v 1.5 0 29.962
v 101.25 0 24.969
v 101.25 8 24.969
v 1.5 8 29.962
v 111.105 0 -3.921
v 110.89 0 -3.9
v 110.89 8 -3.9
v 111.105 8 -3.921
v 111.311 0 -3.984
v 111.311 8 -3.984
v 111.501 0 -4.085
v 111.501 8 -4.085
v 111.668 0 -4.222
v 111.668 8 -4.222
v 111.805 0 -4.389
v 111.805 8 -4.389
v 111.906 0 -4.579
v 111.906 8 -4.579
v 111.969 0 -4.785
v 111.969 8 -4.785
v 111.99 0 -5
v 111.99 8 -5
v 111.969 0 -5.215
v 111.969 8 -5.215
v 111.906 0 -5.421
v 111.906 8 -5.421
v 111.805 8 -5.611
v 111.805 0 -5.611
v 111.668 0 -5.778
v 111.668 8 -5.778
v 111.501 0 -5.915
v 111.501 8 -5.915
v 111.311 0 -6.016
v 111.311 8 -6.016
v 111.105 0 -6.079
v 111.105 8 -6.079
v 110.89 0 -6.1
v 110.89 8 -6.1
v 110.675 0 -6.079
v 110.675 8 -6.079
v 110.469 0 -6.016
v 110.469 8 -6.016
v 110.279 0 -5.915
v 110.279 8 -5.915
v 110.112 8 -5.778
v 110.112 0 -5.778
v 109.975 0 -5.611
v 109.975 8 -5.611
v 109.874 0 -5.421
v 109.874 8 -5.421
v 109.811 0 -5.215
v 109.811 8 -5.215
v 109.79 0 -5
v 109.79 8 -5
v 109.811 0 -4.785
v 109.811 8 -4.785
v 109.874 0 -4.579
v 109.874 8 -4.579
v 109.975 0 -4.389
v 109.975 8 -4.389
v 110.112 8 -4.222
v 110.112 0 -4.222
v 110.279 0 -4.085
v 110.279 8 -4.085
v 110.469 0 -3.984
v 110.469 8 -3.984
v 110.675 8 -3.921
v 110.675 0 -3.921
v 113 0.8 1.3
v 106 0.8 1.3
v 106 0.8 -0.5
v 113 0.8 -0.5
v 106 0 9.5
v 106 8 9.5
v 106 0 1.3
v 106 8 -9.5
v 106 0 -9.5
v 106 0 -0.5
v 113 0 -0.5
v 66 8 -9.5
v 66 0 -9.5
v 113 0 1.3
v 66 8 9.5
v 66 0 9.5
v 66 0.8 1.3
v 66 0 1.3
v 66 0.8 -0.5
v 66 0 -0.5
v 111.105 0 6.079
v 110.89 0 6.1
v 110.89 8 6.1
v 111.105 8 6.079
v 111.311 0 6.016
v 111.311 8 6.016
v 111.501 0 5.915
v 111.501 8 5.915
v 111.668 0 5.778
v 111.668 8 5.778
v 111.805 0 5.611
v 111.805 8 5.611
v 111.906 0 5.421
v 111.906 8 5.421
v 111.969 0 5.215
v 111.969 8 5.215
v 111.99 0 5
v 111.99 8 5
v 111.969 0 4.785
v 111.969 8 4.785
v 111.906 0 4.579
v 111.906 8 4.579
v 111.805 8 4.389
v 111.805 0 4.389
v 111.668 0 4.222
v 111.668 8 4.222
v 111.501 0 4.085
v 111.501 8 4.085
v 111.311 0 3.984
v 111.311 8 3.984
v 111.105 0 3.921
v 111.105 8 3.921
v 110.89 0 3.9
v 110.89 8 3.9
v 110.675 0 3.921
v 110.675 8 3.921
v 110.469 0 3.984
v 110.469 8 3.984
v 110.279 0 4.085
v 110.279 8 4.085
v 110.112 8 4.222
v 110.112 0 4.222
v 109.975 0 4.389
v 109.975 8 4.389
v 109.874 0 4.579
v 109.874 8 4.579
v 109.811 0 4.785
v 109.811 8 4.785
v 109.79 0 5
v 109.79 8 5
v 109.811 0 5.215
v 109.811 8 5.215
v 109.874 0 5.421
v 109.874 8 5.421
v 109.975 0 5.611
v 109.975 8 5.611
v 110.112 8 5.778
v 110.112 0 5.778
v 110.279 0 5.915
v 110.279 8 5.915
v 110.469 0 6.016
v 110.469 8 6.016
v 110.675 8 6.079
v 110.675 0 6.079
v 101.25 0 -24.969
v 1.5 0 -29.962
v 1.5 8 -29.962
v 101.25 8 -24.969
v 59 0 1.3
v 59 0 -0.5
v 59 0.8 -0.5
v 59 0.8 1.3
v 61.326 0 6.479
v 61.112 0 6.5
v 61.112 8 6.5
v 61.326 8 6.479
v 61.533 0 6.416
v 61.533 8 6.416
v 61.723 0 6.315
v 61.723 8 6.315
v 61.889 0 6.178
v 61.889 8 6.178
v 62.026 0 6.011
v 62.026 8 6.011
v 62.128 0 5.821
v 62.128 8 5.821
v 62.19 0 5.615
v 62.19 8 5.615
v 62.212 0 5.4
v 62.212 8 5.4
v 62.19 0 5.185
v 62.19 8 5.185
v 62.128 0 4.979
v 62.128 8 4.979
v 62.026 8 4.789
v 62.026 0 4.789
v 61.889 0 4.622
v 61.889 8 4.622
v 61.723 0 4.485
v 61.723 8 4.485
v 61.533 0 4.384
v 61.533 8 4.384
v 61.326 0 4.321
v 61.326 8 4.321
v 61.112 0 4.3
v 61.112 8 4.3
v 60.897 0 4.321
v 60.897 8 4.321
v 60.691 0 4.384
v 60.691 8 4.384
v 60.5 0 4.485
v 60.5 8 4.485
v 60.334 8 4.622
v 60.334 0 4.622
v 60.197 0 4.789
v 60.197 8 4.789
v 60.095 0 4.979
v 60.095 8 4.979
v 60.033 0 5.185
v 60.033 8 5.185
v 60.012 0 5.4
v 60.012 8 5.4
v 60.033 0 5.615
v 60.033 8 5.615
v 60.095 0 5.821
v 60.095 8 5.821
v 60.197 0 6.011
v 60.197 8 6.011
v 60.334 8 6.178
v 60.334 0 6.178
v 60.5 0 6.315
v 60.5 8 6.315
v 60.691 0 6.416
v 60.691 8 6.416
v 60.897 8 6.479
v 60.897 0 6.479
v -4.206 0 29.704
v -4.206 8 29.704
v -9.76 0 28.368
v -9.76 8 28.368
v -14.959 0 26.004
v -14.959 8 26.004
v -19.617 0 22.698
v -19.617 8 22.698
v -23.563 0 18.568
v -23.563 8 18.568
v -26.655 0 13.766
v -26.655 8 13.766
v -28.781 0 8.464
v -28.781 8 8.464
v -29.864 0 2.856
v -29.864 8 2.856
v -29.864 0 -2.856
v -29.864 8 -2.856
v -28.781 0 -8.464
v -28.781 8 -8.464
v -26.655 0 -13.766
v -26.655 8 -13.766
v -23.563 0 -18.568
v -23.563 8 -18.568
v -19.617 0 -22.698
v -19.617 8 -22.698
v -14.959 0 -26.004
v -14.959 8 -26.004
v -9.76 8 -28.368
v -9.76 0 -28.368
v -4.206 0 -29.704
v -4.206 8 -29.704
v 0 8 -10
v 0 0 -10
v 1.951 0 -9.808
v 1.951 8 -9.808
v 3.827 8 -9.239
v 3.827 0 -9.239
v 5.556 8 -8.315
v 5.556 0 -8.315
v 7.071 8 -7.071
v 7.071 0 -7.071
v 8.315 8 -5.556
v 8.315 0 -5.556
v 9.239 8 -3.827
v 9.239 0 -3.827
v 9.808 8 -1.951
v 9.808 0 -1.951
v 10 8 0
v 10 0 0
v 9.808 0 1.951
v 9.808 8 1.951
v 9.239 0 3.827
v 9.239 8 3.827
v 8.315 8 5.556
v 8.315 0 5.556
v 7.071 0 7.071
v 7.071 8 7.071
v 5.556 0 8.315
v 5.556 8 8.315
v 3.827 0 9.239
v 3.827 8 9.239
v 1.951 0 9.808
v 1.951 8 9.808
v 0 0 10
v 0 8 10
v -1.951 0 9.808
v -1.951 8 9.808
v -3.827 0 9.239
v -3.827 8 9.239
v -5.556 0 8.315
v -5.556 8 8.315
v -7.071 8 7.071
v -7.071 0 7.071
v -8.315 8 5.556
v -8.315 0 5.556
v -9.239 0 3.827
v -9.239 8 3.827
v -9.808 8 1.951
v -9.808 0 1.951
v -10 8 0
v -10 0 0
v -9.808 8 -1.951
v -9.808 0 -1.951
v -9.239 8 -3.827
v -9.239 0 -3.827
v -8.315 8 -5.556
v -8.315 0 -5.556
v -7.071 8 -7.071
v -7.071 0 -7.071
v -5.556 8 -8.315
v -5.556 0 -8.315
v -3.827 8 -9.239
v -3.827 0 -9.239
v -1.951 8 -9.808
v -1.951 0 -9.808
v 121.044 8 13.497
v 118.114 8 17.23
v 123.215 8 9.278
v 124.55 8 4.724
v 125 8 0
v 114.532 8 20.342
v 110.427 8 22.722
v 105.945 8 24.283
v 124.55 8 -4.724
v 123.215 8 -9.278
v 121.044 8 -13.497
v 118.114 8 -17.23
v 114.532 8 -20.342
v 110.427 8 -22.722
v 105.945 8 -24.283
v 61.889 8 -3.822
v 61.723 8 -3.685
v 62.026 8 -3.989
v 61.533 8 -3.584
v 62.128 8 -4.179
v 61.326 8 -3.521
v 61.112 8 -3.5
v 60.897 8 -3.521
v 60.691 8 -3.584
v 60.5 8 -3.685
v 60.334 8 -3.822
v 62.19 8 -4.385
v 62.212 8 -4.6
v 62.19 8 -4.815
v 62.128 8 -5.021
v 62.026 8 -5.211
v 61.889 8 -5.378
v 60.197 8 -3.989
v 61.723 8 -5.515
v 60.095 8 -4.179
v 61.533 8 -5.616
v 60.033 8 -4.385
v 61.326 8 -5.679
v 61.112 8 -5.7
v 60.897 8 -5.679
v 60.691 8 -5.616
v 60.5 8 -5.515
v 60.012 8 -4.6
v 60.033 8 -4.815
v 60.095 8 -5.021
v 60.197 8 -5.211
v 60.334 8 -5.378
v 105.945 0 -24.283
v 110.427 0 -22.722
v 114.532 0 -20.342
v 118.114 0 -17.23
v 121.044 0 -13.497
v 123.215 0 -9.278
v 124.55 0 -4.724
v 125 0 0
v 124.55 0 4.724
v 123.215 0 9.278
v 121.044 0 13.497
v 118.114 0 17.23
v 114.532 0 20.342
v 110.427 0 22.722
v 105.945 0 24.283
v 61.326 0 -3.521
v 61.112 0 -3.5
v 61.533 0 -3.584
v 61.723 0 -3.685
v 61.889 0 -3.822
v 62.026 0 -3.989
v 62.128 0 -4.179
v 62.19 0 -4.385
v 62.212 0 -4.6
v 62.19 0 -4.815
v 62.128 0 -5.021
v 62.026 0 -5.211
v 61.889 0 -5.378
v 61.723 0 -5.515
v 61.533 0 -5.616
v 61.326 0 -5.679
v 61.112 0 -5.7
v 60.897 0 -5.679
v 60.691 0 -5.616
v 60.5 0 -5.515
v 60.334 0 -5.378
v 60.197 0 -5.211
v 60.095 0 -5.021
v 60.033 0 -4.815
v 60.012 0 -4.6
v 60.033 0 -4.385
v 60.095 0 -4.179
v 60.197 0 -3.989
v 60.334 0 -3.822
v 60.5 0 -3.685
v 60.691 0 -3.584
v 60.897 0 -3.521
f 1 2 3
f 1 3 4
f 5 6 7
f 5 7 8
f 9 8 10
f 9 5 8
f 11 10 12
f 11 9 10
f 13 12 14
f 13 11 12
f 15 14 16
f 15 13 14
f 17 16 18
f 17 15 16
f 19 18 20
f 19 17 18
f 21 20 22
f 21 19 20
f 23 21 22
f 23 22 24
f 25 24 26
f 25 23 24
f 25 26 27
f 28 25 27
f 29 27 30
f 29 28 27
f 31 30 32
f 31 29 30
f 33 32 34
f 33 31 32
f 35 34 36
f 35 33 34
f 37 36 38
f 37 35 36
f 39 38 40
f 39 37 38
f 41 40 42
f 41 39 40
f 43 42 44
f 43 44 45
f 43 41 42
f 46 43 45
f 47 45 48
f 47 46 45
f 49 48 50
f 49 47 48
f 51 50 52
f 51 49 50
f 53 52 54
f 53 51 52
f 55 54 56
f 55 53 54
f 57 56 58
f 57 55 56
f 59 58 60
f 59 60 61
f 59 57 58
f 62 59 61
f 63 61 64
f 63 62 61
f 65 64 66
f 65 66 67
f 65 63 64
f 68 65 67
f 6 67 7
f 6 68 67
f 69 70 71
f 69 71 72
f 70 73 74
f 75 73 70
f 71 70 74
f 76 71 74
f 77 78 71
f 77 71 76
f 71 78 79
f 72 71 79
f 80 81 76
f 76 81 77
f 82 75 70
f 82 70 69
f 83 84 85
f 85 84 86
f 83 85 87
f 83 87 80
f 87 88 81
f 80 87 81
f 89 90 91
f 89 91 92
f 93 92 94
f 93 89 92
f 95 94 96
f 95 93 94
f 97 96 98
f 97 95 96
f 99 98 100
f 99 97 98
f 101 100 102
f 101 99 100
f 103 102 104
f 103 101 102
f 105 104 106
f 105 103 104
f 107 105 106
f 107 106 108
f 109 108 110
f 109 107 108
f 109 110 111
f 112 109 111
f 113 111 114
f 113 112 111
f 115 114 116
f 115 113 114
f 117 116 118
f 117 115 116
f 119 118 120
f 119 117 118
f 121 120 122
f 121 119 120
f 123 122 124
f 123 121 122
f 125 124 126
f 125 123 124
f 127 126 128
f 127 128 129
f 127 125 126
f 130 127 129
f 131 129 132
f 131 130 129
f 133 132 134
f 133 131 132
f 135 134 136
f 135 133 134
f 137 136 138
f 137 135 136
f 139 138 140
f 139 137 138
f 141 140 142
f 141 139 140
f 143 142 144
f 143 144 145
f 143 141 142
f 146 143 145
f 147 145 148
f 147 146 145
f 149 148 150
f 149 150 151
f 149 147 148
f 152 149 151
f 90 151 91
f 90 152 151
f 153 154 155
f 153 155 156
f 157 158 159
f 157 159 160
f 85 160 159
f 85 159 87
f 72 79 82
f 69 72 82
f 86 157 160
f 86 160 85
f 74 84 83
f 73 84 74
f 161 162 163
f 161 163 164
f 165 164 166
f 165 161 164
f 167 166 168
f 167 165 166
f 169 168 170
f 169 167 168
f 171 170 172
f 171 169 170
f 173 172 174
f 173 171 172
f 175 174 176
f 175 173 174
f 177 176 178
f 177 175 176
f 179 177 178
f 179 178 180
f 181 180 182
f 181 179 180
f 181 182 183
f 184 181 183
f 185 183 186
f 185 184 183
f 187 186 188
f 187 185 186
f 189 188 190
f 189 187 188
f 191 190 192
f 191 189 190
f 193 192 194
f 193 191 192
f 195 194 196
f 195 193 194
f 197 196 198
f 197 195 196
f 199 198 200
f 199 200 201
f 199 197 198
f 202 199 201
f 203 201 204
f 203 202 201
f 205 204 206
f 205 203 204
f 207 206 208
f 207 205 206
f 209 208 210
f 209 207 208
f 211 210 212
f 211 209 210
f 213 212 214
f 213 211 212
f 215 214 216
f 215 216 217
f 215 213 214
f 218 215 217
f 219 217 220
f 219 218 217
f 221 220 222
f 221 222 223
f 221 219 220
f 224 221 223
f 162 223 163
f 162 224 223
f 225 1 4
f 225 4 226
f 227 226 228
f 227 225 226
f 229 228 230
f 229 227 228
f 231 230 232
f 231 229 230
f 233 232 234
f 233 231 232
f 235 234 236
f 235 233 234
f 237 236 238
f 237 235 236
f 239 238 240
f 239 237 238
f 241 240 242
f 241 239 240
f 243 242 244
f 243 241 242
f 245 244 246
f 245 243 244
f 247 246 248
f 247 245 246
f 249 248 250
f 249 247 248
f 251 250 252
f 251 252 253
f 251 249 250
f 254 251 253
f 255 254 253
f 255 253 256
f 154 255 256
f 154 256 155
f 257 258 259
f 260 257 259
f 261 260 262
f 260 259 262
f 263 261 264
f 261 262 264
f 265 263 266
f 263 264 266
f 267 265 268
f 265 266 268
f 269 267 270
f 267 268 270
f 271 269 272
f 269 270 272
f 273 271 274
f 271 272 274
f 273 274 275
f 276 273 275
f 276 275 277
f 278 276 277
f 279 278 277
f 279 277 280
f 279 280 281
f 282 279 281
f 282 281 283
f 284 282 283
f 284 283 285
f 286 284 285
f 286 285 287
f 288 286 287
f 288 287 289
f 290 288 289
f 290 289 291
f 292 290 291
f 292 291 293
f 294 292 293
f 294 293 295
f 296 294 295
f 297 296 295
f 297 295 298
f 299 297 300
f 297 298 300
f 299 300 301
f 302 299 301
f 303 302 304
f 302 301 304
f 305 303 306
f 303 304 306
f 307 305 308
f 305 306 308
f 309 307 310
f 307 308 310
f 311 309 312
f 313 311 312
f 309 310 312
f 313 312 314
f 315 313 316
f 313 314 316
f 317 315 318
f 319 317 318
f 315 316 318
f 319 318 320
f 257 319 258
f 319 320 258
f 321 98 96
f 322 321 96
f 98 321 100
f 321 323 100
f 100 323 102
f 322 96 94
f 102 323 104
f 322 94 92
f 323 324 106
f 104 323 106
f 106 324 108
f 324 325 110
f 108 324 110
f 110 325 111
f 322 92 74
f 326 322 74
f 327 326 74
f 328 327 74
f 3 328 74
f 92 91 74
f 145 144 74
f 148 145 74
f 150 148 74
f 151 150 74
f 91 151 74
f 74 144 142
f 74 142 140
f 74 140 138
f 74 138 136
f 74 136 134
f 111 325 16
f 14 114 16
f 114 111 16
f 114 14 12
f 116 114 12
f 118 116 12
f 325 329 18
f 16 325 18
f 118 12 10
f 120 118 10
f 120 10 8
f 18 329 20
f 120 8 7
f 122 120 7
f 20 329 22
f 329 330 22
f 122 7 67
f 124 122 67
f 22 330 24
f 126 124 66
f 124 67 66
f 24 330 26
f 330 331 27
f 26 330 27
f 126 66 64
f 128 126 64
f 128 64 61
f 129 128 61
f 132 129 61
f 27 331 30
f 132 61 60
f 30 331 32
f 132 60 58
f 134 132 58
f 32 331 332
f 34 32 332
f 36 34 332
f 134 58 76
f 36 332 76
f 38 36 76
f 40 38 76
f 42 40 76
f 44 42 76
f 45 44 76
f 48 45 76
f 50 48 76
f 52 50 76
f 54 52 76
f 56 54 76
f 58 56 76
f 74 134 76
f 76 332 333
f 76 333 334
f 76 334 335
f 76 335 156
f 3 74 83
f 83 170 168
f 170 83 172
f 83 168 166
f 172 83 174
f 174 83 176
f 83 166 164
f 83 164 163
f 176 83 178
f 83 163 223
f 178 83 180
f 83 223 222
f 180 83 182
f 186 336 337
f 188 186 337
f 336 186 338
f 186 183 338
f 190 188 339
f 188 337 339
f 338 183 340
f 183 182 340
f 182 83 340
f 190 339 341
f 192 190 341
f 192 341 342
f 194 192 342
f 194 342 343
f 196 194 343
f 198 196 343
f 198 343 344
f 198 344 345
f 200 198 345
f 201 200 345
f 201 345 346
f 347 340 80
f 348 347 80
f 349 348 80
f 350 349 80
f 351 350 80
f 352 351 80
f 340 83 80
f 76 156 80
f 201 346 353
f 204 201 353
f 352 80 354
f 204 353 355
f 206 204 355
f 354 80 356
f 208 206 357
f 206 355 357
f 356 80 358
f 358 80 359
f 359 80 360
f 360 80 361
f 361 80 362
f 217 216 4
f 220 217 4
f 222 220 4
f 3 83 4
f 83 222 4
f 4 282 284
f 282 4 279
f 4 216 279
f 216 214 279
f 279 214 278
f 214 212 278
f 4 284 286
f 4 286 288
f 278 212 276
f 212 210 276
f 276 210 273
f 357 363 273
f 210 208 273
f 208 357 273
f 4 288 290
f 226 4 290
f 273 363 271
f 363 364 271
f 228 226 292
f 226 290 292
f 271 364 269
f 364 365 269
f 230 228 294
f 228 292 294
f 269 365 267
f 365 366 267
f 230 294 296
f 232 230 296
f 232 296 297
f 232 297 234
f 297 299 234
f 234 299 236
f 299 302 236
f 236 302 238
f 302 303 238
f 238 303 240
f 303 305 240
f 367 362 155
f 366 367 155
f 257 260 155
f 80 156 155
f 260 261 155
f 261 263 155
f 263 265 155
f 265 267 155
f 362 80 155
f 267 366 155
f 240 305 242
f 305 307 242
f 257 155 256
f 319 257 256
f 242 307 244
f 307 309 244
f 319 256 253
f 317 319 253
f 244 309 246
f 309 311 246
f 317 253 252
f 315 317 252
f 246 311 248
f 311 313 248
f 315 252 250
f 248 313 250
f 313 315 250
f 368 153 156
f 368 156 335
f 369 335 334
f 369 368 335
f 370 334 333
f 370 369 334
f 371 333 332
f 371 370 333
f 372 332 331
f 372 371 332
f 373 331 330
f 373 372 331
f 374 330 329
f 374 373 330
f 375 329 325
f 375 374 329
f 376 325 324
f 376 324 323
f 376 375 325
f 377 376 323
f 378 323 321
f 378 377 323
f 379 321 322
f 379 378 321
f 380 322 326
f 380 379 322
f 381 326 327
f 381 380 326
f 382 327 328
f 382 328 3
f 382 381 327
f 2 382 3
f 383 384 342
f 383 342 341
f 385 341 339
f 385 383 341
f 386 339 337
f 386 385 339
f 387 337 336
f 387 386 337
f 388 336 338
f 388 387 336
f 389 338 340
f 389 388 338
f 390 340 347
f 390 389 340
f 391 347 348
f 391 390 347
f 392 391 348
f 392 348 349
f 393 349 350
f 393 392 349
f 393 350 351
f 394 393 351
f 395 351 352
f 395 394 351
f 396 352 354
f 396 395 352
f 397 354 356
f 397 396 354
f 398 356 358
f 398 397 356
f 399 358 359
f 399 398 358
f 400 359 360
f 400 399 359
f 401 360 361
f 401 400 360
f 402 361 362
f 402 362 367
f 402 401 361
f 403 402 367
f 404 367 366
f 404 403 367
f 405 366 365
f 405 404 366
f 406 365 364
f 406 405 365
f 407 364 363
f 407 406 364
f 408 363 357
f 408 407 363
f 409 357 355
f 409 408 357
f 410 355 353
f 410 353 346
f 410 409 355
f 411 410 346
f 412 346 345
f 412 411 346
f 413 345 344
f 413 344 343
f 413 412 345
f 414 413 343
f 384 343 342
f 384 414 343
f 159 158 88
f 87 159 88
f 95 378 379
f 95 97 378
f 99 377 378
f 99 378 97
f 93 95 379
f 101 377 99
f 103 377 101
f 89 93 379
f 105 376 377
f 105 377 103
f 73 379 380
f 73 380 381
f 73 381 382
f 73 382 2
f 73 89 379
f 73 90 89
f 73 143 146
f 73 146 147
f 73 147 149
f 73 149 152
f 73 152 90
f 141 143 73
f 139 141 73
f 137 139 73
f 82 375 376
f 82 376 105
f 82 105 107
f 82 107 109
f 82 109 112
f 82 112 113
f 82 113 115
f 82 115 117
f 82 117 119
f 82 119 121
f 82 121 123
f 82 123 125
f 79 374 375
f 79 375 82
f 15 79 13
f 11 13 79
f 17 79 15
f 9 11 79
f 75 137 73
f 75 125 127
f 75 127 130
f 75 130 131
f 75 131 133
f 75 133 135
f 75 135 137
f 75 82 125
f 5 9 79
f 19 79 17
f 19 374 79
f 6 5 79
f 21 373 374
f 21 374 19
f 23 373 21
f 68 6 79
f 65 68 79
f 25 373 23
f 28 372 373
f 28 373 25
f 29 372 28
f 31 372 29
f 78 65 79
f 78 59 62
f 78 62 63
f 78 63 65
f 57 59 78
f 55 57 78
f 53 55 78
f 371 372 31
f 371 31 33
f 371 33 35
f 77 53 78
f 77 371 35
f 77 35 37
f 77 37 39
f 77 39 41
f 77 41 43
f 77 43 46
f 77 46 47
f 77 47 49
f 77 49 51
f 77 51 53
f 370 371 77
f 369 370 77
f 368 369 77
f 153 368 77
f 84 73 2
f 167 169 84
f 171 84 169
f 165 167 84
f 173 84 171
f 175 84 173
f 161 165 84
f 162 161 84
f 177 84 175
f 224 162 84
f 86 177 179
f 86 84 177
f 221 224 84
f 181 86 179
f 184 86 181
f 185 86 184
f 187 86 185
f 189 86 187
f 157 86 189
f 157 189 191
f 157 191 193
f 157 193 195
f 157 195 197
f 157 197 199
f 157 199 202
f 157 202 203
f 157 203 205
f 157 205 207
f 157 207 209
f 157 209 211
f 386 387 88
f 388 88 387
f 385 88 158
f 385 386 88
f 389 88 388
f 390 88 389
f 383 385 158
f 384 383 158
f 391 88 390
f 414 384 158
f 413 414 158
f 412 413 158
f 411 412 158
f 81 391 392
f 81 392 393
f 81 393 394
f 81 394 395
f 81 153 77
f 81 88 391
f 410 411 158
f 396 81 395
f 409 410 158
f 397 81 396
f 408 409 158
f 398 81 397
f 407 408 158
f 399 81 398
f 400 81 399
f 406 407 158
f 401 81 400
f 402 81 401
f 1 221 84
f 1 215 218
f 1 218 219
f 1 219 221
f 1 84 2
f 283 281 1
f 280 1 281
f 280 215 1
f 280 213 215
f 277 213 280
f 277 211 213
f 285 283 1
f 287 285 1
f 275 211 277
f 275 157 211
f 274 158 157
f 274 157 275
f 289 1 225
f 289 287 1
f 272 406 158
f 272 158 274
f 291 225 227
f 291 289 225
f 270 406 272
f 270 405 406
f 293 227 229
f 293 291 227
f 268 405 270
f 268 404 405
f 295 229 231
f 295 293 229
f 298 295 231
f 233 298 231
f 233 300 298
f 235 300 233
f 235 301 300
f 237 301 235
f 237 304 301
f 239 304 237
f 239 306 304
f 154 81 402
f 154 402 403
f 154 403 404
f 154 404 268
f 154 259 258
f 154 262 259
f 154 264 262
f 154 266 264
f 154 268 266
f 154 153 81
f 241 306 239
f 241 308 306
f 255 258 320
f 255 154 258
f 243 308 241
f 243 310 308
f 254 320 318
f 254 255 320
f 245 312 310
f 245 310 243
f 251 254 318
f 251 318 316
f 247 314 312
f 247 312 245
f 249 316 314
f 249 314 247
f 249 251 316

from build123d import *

# Parameters (mm, degrees)
CROQUIS1_R              = 1.1
CROQUIS1_R_2            = 0.8
CROQUIS1_W              = 40
CROQUIS1_H              = 19
SALIENTE_EXTRUIR1_DEPTH = 8
CROQUIS3_W              = 7
CROQUIS3_H              = 1.8
CORTAR_EXTRUIR2_DEPTH   = 0.8
CROQUIS2_R              = 10
CORTAR_EXTRUIR4_DEPTH   = 129.798291914


with BuildPart() as part:
    # Croquis1 → Saliente-Extruir1 (new body)
    with BuildSketch(Plane(origin=(0, 0, 0), x_dir=(1, 0, 0), z_dir=(0, 1, 0))):
        with BuildLine():
            Line((1.5, 29.962476533), (101.25, 24.968730444))
            ThreePointArc((101.25, 24.968730444), (125, 0), (101.25, -24.968730444))
            Line((101.25, -24.968730444), (1.5, -29.962476533))
            ThreePointArc((1.5, -29.962476533), (-30, 0), (1.5, 29.962476533))
        make_face()
        with Locations(Location((110.89, 5, 0), (0, 0, 270))):
            Circle(CROQUIS1_R, mode=Mode.SUBTRACT)
        with Locations(Location((110.89, -5, 0), (0, 0, 270))):
            Circle(CROQUIS1_R, mode=Mode.SUBTRACT)
        with Locations(Location((61.111607097, -5.4, 0), (0, 0, 270))):
            Circle(CROQUIS1_R, mode=Mode.SUBTRACT)
        with Locations(Location((61.111607097, 4.6, 0), (0, 0, 270))):
            Circle(CROQUIS1_R, mode=Mode.SUBTRACT)
        with Locations(Location((7.5, 0, 0), (0, 0, 270))):
            Circle(CROQUIS1_R_2, mode=Mode.SUBTRACT)
        with Locations(Location((0, -7.5, 0), (0, 0, 270))):
            Circle(CROQUIS1_R_2, mode=Mode.SUBTRACT)
        with Locations(Location((-7.5, 0, 0), (0, 0, 270))):
            Circle(CROQUIS1_R_2, mode=Mode.SUBTRACT)
        with Locations(Location((0, 7.5, 0), (0, 0, 270))):
            Circle(CROQUIS1_R_2, mode=Mode.SUBTRACT)
        with Locations(Location((0, 0, 0), (0, 0, 270))):
            Circle(CROQUIS1_R_2, mode=Mode.SUBTRACT)
        with Locations((86, 0)):
            Rectangle(CROQUIS1_W, CROQUIS1_H, mode=Mode.SUBTRACT)
    extrude(amount=SALIENTE_EXTRUIR1_DEPTH)

    # Croquis3 → Cortar-Extruir2 (cut)
    with BuildSketch(Plane.XZ):
        with Locations((62.5, 0.4)):
            Rectangle(CROQUIS3_W, CROQUIS3_H)
        with Locations((109.5, 0.4)):
            Rectangle(CROQUIS3_W, CROQUIS3_H)
    extrude(amount=-CORTAR_EXTRUIR2_DEPTH, mode=Mode.SUBTRACT)

    # Croquis2 → Cortar-Extruir4 (cut, through all)
    with BuildSketch(Plane.XZ):
        with Locations(Location((0, 0, 0), (0, 0, 270))):
            Circle(CROQUIS2_R)
    extrude(amount=-CORTAR_EXTRUIR4_DEPTH, mode=Mode.SUBTRACT)


solid = part.part
